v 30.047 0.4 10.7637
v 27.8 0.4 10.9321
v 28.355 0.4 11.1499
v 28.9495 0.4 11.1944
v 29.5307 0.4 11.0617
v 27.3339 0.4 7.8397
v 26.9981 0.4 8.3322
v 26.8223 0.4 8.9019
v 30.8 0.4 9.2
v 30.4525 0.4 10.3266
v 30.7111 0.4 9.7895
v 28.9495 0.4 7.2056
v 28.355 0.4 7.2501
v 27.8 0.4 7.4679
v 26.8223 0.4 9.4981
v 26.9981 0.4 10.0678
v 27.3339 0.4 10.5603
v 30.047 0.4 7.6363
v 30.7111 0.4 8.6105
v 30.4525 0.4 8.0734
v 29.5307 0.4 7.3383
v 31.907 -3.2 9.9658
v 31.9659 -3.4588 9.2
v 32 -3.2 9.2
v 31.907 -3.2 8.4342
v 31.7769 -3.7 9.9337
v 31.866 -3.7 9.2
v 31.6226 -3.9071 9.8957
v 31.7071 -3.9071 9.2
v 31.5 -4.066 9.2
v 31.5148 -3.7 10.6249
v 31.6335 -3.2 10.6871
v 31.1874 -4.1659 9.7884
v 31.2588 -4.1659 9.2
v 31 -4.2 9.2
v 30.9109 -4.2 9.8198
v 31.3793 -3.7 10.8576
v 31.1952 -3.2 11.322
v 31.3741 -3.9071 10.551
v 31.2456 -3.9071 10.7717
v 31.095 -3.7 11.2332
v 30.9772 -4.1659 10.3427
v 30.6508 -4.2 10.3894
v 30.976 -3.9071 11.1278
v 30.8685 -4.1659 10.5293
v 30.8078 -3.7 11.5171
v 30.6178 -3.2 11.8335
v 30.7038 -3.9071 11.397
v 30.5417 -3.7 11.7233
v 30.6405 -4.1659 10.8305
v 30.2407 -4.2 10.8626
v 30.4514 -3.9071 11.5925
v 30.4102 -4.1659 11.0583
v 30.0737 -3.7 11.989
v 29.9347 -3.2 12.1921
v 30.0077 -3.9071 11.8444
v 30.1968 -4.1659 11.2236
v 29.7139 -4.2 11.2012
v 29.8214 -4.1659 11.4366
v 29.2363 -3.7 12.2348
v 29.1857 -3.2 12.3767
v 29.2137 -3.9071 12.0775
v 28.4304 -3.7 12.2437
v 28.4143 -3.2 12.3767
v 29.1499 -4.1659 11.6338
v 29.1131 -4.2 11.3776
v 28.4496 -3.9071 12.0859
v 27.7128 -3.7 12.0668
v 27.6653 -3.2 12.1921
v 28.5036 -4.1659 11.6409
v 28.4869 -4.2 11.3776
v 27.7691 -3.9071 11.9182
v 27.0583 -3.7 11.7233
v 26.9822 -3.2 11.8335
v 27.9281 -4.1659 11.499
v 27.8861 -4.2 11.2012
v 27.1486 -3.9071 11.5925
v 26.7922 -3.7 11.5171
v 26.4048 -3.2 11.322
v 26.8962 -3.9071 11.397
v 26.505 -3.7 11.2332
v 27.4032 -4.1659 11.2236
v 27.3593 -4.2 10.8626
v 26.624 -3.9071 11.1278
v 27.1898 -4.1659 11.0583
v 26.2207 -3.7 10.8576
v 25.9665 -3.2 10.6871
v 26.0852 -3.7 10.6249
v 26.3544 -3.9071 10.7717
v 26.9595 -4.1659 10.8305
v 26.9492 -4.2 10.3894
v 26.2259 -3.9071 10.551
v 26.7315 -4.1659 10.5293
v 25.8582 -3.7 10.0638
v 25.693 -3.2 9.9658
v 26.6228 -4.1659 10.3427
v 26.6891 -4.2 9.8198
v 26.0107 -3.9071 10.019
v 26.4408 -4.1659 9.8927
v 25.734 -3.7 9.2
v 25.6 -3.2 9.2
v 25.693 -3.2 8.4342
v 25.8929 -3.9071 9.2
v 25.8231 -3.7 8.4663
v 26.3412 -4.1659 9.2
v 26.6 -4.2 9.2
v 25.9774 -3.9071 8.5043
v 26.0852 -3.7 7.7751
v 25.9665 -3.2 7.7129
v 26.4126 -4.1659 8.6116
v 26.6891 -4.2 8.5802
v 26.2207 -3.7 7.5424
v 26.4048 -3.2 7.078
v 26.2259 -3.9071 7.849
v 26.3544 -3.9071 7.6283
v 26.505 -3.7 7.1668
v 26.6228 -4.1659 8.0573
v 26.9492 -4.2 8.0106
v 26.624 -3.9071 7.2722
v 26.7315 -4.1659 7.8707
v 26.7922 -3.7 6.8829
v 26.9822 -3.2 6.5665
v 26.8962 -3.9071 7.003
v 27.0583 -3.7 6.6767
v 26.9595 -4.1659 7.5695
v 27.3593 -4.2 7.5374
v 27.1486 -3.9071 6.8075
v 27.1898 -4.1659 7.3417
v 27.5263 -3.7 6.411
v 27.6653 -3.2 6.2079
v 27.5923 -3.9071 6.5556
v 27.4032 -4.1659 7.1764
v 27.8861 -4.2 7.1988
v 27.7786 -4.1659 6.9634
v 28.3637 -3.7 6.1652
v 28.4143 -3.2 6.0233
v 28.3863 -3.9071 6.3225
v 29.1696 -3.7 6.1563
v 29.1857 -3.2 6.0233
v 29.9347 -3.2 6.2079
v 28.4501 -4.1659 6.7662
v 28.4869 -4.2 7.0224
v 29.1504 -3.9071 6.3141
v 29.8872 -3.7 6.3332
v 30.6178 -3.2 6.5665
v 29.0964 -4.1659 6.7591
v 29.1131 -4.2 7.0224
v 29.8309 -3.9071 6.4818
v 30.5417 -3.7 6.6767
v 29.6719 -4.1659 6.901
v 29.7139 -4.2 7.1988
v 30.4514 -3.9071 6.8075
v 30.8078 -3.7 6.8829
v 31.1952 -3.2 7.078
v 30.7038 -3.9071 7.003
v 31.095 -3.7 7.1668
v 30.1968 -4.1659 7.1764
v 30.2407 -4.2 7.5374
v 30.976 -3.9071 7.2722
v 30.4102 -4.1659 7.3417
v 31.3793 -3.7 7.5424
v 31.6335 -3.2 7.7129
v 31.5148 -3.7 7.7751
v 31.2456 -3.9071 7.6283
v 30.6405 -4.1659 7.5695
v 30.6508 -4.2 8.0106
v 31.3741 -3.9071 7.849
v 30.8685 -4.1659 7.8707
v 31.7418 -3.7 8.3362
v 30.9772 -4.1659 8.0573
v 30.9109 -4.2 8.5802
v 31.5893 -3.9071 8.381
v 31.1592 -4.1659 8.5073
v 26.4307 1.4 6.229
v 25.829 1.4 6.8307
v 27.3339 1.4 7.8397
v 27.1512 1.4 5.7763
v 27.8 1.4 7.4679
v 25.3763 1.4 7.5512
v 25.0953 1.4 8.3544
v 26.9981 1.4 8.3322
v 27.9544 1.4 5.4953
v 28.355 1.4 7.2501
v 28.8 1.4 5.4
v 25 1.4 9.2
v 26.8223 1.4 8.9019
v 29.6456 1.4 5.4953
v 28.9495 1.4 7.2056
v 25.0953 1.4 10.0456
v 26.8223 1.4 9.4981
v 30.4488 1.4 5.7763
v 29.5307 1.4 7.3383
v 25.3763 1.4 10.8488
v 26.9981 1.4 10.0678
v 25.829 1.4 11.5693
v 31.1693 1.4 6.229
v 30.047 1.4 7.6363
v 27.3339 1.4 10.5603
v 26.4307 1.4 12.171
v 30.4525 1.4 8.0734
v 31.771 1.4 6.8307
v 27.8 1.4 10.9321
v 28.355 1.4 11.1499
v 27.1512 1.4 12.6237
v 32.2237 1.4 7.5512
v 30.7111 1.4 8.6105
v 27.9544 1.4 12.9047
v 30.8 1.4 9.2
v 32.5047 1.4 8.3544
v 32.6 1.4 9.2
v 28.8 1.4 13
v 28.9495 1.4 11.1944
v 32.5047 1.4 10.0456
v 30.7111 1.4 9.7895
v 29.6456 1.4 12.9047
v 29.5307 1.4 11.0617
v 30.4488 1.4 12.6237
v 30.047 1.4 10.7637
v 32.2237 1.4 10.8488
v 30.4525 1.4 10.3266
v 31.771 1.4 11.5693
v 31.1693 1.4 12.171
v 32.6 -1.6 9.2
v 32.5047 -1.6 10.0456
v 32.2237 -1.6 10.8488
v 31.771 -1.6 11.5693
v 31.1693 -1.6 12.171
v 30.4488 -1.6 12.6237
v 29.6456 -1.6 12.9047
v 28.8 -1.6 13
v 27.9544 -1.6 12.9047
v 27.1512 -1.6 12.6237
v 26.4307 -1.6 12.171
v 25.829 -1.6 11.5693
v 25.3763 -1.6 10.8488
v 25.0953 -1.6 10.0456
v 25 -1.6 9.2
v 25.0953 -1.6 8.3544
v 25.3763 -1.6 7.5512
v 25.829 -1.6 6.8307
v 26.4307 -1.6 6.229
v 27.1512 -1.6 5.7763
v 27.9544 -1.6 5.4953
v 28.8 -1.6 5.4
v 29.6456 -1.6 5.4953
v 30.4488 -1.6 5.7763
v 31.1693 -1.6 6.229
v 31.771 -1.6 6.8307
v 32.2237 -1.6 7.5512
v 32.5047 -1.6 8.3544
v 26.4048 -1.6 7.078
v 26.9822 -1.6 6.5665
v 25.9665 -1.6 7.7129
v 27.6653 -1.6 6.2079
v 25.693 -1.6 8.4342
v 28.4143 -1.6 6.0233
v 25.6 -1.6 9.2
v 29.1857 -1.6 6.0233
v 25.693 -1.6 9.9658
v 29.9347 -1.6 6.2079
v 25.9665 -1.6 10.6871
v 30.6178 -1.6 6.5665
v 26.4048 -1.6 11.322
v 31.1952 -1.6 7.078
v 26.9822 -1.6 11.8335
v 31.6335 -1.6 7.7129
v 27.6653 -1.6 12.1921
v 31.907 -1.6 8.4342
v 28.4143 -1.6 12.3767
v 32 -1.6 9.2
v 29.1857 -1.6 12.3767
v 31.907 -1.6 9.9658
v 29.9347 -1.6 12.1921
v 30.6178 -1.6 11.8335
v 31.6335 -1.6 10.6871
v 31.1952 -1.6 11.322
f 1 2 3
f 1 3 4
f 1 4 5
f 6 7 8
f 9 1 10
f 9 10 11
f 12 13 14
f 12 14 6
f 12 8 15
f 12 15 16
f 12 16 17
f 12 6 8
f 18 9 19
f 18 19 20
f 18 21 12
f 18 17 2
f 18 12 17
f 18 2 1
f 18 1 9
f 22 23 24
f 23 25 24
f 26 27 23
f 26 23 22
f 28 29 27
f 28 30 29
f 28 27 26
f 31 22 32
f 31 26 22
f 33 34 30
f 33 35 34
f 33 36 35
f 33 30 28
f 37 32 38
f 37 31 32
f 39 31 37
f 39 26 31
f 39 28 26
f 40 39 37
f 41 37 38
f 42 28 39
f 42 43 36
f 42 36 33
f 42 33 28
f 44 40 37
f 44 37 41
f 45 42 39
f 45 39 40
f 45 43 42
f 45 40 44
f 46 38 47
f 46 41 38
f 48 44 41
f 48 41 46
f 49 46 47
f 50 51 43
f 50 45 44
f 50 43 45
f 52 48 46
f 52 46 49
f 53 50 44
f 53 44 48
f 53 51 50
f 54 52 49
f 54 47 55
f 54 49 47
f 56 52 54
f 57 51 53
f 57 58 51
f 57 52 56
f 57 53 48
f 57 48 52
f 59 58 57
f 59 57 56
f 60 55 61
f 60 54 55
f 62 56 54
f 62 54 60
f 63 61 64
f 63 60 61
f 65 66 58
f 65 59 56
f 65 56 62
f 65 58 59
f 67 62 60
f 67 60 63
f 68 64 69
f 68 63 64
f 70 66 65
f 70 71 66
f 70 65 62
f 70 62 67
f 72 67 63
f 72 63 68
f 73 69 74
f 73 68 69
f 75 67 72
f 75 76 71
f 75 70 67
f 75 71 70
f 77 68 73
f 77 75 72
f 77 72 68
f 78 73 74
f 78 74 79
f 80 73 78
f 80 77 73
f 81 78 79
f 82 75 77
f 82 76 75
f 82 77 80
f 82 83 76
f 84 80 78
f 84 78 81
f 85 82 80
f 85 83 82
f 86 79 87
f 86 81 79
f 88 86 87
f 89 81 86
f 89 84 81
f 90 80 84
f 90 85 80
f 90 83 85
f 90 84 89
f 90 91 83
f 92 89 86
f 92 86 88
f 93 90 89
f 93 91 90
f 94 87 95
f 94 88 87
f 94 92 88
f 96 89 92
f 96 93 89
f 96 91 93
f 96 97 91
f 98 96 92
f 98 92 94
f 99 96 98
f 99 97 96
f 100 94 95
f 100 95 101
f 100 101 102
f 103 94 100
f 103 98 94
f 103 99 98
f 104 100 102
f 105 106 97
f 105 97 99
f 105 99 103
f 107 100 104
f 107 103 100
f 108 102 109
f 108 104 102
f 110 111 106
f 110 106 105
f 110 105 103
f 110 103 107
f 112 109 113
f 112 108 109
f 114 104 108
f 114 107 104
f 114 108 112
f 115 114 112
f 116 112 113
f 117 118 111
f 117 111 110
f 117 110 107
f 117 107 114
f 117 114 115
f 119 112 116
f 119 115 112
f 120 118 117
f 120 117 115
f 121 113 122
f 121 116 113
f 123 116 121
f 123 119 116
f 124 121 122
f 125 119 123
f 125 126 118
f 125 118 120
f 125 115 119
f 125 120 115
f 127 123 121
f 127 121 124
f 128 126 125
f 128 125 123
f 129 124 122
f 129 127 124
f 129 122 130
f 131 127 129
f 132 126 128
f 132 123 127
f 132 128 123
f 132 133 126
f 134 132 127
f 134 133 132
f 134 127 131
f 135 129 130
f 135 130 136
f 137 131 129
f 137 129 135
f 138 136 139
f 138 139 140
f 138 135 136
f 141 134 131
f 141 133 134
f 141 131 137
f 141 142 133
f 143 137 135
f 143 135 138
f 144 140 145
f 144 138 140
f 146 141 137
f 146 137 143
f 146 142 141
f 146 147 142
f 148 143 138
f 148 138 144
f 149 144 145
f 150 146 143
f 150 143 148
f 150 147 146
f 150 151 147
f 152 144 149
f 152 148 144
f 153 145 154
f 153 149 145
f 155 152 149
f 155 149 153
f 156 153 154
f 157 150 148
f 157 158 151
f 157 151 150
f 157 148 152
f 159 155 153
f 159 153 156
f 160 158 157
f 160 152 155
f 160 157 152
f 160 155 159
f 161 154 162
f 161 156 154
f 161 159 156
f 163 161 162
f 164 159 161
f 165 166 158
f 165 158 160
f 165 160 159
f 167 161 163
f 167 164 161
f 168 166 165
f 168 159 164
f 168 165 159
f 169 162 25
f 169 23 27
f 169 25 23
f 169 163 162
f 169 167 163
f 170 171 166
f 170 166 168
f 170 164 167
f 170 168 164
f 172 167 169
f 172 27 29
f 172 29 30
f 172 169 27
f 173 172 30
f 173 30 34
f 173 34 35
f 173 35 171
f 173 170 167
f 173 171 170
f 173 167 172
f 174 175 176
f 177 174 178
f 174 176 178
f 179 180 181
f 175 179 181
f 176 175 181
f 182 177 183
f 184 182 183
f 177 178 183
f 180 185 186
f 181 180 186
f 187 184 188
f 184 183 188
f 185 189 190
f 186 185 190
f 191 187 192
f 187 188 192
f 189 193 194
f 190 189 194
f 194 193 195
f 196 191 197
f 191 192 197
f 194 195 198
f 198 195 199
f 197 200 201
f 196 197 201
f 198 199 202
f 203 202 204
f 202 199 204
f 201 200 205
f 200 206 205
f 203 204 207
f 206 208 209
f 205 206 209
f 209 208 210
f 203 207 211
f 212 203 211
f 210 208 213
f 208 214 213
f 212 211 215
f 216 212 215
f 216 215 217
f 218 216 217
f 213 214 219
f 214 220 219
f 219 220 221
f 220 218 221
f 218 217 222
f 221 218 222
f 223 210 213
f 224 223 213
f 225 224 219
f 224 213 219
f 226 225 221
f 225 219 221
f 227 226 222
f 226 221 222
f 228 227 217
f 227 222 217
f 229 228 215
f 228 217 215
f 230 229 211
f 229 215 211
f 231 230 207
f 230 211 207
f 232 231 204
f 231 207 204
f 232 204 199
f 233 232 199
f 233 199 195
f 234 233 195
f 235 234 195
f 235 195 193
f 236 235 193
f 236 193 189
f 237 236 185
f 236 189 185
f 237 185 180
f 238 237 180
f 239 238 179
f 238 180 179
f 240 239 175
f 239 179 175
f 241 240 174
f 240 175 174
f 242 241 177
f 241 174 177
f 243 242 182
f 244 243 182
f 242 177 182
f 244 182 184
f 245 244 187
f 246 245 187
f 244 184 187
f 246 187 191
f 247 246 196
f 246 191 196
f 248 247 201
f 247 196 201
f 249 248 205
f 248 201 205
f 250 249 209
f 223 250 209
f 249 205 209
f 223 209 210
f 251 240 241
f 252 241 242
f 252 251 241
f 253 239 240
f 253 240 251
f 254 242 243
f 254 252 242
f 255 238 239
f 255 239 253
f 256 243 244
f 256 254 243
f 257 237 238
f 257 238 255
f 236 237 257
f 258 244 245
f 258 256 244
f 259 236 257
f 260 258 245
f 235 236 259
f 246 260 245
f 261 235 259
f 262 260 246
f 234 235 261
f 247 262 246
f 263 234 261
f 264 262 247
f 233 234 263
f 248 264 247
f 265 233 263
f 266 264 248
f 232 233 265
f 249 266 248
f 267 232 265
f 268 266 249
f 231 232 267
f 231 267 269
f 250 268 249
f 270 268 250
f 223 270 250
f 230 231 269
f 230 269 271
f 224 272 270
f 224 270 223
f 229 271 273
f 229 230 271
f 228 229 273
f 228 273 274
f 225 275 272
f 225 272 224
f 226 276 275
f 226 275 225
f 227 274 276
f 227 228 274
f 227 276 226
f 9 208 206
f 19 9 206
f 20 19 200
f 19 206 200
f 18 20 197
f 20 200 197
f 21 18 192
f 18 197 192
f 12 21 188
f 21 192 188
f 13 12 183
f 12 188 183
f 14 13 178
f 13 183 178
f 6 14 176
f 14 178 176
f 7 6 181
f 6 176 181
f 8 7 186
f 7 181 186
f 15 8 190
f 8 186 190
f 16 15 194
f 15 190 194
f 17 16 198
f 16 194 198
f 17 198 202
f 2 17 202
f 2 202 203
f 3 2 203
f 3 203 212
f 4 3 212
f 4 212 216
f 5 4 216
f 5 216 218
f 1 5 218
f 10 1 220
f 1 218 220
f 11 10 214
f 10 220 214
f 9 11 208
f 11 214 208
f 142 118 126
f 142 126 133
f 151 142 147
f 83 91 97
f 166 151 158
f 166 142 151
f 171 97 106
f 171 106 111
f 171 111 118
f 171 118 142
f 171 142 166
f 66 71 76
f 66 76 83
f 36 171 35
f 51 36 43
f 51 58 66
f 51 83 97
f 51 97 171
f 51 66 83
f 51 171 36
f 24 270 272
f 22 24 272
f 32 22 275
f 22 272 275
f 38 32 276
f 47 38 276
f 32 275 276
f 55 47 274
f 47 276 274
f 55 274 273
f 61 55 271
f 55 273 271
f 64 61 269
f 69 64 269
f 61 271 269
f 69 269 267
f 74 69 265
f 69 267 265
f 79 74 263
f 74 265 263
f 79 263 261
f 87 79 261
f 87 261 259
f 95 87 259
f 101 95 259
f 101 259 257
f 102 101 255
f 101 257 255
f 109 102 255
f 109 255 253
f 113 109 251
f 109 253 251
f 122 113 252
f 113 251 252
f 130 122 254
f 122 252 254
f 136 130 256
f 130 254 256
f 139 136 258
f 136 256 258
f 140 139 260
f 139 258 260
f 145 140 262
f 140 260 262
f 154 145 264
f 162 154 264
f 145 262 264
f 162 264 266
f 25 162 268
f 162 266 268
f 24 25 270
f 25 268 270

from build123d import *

# Parameters (mm, degrees)
SKETCH026_R     = 3.8
PAD009_DEPTH    = 3
SKETCH027_R     = 3.2
PAD010_DEPTH    = 2.6
FILLET_R        = 1
SKETCH029_R     = 2
POCKET013_DEPTH = 1


with BuildPart() as part:
    # Sketch026 → Pad009 (new body)
    with BuildSketch(Plane.XZ):
        with Locations((28.8, 9.2)):
            Circle(SKETCH026_R)
    extrude(amount=PAD009_DEPTH)

    # Sketch027 (on Face3 of Pad009) → Pad010 (join)
    with BuildSketch(Plane.XZ.offset(3)):
        with Locations((28.8, 9.2)):
            Circle(SKETCH027_R)
    extrude(amount=PAD010_DEPTH)

    # Fillet
    fillet_edges = [part.edges().sort_by_distance(p)[0] for p in [
        (25.6, -5.6, 9.2),
    ]]
    fillet(fillet_edges, radius=FILLET_R)

    # Sketch029 (on Face6 of Fillet) → Pocket013 (cut)
    with BuildSketch(Plane(origin=(0, 0, 0), x_dir=(1, 0, 0), z_dir=(0, 1, 0))):
        with Locations((28.8, -9.2)):
            Circle(SKETCH029_R)
    extrude(amount=-POCKET013_DEPTH, mode=Mode.SUBTRACT)


with BuildPart() as part_1:
    # Body003 placement: moved
    add(part.part.moved(Location((0, 1.4, 0))))


solid = part_1.part
